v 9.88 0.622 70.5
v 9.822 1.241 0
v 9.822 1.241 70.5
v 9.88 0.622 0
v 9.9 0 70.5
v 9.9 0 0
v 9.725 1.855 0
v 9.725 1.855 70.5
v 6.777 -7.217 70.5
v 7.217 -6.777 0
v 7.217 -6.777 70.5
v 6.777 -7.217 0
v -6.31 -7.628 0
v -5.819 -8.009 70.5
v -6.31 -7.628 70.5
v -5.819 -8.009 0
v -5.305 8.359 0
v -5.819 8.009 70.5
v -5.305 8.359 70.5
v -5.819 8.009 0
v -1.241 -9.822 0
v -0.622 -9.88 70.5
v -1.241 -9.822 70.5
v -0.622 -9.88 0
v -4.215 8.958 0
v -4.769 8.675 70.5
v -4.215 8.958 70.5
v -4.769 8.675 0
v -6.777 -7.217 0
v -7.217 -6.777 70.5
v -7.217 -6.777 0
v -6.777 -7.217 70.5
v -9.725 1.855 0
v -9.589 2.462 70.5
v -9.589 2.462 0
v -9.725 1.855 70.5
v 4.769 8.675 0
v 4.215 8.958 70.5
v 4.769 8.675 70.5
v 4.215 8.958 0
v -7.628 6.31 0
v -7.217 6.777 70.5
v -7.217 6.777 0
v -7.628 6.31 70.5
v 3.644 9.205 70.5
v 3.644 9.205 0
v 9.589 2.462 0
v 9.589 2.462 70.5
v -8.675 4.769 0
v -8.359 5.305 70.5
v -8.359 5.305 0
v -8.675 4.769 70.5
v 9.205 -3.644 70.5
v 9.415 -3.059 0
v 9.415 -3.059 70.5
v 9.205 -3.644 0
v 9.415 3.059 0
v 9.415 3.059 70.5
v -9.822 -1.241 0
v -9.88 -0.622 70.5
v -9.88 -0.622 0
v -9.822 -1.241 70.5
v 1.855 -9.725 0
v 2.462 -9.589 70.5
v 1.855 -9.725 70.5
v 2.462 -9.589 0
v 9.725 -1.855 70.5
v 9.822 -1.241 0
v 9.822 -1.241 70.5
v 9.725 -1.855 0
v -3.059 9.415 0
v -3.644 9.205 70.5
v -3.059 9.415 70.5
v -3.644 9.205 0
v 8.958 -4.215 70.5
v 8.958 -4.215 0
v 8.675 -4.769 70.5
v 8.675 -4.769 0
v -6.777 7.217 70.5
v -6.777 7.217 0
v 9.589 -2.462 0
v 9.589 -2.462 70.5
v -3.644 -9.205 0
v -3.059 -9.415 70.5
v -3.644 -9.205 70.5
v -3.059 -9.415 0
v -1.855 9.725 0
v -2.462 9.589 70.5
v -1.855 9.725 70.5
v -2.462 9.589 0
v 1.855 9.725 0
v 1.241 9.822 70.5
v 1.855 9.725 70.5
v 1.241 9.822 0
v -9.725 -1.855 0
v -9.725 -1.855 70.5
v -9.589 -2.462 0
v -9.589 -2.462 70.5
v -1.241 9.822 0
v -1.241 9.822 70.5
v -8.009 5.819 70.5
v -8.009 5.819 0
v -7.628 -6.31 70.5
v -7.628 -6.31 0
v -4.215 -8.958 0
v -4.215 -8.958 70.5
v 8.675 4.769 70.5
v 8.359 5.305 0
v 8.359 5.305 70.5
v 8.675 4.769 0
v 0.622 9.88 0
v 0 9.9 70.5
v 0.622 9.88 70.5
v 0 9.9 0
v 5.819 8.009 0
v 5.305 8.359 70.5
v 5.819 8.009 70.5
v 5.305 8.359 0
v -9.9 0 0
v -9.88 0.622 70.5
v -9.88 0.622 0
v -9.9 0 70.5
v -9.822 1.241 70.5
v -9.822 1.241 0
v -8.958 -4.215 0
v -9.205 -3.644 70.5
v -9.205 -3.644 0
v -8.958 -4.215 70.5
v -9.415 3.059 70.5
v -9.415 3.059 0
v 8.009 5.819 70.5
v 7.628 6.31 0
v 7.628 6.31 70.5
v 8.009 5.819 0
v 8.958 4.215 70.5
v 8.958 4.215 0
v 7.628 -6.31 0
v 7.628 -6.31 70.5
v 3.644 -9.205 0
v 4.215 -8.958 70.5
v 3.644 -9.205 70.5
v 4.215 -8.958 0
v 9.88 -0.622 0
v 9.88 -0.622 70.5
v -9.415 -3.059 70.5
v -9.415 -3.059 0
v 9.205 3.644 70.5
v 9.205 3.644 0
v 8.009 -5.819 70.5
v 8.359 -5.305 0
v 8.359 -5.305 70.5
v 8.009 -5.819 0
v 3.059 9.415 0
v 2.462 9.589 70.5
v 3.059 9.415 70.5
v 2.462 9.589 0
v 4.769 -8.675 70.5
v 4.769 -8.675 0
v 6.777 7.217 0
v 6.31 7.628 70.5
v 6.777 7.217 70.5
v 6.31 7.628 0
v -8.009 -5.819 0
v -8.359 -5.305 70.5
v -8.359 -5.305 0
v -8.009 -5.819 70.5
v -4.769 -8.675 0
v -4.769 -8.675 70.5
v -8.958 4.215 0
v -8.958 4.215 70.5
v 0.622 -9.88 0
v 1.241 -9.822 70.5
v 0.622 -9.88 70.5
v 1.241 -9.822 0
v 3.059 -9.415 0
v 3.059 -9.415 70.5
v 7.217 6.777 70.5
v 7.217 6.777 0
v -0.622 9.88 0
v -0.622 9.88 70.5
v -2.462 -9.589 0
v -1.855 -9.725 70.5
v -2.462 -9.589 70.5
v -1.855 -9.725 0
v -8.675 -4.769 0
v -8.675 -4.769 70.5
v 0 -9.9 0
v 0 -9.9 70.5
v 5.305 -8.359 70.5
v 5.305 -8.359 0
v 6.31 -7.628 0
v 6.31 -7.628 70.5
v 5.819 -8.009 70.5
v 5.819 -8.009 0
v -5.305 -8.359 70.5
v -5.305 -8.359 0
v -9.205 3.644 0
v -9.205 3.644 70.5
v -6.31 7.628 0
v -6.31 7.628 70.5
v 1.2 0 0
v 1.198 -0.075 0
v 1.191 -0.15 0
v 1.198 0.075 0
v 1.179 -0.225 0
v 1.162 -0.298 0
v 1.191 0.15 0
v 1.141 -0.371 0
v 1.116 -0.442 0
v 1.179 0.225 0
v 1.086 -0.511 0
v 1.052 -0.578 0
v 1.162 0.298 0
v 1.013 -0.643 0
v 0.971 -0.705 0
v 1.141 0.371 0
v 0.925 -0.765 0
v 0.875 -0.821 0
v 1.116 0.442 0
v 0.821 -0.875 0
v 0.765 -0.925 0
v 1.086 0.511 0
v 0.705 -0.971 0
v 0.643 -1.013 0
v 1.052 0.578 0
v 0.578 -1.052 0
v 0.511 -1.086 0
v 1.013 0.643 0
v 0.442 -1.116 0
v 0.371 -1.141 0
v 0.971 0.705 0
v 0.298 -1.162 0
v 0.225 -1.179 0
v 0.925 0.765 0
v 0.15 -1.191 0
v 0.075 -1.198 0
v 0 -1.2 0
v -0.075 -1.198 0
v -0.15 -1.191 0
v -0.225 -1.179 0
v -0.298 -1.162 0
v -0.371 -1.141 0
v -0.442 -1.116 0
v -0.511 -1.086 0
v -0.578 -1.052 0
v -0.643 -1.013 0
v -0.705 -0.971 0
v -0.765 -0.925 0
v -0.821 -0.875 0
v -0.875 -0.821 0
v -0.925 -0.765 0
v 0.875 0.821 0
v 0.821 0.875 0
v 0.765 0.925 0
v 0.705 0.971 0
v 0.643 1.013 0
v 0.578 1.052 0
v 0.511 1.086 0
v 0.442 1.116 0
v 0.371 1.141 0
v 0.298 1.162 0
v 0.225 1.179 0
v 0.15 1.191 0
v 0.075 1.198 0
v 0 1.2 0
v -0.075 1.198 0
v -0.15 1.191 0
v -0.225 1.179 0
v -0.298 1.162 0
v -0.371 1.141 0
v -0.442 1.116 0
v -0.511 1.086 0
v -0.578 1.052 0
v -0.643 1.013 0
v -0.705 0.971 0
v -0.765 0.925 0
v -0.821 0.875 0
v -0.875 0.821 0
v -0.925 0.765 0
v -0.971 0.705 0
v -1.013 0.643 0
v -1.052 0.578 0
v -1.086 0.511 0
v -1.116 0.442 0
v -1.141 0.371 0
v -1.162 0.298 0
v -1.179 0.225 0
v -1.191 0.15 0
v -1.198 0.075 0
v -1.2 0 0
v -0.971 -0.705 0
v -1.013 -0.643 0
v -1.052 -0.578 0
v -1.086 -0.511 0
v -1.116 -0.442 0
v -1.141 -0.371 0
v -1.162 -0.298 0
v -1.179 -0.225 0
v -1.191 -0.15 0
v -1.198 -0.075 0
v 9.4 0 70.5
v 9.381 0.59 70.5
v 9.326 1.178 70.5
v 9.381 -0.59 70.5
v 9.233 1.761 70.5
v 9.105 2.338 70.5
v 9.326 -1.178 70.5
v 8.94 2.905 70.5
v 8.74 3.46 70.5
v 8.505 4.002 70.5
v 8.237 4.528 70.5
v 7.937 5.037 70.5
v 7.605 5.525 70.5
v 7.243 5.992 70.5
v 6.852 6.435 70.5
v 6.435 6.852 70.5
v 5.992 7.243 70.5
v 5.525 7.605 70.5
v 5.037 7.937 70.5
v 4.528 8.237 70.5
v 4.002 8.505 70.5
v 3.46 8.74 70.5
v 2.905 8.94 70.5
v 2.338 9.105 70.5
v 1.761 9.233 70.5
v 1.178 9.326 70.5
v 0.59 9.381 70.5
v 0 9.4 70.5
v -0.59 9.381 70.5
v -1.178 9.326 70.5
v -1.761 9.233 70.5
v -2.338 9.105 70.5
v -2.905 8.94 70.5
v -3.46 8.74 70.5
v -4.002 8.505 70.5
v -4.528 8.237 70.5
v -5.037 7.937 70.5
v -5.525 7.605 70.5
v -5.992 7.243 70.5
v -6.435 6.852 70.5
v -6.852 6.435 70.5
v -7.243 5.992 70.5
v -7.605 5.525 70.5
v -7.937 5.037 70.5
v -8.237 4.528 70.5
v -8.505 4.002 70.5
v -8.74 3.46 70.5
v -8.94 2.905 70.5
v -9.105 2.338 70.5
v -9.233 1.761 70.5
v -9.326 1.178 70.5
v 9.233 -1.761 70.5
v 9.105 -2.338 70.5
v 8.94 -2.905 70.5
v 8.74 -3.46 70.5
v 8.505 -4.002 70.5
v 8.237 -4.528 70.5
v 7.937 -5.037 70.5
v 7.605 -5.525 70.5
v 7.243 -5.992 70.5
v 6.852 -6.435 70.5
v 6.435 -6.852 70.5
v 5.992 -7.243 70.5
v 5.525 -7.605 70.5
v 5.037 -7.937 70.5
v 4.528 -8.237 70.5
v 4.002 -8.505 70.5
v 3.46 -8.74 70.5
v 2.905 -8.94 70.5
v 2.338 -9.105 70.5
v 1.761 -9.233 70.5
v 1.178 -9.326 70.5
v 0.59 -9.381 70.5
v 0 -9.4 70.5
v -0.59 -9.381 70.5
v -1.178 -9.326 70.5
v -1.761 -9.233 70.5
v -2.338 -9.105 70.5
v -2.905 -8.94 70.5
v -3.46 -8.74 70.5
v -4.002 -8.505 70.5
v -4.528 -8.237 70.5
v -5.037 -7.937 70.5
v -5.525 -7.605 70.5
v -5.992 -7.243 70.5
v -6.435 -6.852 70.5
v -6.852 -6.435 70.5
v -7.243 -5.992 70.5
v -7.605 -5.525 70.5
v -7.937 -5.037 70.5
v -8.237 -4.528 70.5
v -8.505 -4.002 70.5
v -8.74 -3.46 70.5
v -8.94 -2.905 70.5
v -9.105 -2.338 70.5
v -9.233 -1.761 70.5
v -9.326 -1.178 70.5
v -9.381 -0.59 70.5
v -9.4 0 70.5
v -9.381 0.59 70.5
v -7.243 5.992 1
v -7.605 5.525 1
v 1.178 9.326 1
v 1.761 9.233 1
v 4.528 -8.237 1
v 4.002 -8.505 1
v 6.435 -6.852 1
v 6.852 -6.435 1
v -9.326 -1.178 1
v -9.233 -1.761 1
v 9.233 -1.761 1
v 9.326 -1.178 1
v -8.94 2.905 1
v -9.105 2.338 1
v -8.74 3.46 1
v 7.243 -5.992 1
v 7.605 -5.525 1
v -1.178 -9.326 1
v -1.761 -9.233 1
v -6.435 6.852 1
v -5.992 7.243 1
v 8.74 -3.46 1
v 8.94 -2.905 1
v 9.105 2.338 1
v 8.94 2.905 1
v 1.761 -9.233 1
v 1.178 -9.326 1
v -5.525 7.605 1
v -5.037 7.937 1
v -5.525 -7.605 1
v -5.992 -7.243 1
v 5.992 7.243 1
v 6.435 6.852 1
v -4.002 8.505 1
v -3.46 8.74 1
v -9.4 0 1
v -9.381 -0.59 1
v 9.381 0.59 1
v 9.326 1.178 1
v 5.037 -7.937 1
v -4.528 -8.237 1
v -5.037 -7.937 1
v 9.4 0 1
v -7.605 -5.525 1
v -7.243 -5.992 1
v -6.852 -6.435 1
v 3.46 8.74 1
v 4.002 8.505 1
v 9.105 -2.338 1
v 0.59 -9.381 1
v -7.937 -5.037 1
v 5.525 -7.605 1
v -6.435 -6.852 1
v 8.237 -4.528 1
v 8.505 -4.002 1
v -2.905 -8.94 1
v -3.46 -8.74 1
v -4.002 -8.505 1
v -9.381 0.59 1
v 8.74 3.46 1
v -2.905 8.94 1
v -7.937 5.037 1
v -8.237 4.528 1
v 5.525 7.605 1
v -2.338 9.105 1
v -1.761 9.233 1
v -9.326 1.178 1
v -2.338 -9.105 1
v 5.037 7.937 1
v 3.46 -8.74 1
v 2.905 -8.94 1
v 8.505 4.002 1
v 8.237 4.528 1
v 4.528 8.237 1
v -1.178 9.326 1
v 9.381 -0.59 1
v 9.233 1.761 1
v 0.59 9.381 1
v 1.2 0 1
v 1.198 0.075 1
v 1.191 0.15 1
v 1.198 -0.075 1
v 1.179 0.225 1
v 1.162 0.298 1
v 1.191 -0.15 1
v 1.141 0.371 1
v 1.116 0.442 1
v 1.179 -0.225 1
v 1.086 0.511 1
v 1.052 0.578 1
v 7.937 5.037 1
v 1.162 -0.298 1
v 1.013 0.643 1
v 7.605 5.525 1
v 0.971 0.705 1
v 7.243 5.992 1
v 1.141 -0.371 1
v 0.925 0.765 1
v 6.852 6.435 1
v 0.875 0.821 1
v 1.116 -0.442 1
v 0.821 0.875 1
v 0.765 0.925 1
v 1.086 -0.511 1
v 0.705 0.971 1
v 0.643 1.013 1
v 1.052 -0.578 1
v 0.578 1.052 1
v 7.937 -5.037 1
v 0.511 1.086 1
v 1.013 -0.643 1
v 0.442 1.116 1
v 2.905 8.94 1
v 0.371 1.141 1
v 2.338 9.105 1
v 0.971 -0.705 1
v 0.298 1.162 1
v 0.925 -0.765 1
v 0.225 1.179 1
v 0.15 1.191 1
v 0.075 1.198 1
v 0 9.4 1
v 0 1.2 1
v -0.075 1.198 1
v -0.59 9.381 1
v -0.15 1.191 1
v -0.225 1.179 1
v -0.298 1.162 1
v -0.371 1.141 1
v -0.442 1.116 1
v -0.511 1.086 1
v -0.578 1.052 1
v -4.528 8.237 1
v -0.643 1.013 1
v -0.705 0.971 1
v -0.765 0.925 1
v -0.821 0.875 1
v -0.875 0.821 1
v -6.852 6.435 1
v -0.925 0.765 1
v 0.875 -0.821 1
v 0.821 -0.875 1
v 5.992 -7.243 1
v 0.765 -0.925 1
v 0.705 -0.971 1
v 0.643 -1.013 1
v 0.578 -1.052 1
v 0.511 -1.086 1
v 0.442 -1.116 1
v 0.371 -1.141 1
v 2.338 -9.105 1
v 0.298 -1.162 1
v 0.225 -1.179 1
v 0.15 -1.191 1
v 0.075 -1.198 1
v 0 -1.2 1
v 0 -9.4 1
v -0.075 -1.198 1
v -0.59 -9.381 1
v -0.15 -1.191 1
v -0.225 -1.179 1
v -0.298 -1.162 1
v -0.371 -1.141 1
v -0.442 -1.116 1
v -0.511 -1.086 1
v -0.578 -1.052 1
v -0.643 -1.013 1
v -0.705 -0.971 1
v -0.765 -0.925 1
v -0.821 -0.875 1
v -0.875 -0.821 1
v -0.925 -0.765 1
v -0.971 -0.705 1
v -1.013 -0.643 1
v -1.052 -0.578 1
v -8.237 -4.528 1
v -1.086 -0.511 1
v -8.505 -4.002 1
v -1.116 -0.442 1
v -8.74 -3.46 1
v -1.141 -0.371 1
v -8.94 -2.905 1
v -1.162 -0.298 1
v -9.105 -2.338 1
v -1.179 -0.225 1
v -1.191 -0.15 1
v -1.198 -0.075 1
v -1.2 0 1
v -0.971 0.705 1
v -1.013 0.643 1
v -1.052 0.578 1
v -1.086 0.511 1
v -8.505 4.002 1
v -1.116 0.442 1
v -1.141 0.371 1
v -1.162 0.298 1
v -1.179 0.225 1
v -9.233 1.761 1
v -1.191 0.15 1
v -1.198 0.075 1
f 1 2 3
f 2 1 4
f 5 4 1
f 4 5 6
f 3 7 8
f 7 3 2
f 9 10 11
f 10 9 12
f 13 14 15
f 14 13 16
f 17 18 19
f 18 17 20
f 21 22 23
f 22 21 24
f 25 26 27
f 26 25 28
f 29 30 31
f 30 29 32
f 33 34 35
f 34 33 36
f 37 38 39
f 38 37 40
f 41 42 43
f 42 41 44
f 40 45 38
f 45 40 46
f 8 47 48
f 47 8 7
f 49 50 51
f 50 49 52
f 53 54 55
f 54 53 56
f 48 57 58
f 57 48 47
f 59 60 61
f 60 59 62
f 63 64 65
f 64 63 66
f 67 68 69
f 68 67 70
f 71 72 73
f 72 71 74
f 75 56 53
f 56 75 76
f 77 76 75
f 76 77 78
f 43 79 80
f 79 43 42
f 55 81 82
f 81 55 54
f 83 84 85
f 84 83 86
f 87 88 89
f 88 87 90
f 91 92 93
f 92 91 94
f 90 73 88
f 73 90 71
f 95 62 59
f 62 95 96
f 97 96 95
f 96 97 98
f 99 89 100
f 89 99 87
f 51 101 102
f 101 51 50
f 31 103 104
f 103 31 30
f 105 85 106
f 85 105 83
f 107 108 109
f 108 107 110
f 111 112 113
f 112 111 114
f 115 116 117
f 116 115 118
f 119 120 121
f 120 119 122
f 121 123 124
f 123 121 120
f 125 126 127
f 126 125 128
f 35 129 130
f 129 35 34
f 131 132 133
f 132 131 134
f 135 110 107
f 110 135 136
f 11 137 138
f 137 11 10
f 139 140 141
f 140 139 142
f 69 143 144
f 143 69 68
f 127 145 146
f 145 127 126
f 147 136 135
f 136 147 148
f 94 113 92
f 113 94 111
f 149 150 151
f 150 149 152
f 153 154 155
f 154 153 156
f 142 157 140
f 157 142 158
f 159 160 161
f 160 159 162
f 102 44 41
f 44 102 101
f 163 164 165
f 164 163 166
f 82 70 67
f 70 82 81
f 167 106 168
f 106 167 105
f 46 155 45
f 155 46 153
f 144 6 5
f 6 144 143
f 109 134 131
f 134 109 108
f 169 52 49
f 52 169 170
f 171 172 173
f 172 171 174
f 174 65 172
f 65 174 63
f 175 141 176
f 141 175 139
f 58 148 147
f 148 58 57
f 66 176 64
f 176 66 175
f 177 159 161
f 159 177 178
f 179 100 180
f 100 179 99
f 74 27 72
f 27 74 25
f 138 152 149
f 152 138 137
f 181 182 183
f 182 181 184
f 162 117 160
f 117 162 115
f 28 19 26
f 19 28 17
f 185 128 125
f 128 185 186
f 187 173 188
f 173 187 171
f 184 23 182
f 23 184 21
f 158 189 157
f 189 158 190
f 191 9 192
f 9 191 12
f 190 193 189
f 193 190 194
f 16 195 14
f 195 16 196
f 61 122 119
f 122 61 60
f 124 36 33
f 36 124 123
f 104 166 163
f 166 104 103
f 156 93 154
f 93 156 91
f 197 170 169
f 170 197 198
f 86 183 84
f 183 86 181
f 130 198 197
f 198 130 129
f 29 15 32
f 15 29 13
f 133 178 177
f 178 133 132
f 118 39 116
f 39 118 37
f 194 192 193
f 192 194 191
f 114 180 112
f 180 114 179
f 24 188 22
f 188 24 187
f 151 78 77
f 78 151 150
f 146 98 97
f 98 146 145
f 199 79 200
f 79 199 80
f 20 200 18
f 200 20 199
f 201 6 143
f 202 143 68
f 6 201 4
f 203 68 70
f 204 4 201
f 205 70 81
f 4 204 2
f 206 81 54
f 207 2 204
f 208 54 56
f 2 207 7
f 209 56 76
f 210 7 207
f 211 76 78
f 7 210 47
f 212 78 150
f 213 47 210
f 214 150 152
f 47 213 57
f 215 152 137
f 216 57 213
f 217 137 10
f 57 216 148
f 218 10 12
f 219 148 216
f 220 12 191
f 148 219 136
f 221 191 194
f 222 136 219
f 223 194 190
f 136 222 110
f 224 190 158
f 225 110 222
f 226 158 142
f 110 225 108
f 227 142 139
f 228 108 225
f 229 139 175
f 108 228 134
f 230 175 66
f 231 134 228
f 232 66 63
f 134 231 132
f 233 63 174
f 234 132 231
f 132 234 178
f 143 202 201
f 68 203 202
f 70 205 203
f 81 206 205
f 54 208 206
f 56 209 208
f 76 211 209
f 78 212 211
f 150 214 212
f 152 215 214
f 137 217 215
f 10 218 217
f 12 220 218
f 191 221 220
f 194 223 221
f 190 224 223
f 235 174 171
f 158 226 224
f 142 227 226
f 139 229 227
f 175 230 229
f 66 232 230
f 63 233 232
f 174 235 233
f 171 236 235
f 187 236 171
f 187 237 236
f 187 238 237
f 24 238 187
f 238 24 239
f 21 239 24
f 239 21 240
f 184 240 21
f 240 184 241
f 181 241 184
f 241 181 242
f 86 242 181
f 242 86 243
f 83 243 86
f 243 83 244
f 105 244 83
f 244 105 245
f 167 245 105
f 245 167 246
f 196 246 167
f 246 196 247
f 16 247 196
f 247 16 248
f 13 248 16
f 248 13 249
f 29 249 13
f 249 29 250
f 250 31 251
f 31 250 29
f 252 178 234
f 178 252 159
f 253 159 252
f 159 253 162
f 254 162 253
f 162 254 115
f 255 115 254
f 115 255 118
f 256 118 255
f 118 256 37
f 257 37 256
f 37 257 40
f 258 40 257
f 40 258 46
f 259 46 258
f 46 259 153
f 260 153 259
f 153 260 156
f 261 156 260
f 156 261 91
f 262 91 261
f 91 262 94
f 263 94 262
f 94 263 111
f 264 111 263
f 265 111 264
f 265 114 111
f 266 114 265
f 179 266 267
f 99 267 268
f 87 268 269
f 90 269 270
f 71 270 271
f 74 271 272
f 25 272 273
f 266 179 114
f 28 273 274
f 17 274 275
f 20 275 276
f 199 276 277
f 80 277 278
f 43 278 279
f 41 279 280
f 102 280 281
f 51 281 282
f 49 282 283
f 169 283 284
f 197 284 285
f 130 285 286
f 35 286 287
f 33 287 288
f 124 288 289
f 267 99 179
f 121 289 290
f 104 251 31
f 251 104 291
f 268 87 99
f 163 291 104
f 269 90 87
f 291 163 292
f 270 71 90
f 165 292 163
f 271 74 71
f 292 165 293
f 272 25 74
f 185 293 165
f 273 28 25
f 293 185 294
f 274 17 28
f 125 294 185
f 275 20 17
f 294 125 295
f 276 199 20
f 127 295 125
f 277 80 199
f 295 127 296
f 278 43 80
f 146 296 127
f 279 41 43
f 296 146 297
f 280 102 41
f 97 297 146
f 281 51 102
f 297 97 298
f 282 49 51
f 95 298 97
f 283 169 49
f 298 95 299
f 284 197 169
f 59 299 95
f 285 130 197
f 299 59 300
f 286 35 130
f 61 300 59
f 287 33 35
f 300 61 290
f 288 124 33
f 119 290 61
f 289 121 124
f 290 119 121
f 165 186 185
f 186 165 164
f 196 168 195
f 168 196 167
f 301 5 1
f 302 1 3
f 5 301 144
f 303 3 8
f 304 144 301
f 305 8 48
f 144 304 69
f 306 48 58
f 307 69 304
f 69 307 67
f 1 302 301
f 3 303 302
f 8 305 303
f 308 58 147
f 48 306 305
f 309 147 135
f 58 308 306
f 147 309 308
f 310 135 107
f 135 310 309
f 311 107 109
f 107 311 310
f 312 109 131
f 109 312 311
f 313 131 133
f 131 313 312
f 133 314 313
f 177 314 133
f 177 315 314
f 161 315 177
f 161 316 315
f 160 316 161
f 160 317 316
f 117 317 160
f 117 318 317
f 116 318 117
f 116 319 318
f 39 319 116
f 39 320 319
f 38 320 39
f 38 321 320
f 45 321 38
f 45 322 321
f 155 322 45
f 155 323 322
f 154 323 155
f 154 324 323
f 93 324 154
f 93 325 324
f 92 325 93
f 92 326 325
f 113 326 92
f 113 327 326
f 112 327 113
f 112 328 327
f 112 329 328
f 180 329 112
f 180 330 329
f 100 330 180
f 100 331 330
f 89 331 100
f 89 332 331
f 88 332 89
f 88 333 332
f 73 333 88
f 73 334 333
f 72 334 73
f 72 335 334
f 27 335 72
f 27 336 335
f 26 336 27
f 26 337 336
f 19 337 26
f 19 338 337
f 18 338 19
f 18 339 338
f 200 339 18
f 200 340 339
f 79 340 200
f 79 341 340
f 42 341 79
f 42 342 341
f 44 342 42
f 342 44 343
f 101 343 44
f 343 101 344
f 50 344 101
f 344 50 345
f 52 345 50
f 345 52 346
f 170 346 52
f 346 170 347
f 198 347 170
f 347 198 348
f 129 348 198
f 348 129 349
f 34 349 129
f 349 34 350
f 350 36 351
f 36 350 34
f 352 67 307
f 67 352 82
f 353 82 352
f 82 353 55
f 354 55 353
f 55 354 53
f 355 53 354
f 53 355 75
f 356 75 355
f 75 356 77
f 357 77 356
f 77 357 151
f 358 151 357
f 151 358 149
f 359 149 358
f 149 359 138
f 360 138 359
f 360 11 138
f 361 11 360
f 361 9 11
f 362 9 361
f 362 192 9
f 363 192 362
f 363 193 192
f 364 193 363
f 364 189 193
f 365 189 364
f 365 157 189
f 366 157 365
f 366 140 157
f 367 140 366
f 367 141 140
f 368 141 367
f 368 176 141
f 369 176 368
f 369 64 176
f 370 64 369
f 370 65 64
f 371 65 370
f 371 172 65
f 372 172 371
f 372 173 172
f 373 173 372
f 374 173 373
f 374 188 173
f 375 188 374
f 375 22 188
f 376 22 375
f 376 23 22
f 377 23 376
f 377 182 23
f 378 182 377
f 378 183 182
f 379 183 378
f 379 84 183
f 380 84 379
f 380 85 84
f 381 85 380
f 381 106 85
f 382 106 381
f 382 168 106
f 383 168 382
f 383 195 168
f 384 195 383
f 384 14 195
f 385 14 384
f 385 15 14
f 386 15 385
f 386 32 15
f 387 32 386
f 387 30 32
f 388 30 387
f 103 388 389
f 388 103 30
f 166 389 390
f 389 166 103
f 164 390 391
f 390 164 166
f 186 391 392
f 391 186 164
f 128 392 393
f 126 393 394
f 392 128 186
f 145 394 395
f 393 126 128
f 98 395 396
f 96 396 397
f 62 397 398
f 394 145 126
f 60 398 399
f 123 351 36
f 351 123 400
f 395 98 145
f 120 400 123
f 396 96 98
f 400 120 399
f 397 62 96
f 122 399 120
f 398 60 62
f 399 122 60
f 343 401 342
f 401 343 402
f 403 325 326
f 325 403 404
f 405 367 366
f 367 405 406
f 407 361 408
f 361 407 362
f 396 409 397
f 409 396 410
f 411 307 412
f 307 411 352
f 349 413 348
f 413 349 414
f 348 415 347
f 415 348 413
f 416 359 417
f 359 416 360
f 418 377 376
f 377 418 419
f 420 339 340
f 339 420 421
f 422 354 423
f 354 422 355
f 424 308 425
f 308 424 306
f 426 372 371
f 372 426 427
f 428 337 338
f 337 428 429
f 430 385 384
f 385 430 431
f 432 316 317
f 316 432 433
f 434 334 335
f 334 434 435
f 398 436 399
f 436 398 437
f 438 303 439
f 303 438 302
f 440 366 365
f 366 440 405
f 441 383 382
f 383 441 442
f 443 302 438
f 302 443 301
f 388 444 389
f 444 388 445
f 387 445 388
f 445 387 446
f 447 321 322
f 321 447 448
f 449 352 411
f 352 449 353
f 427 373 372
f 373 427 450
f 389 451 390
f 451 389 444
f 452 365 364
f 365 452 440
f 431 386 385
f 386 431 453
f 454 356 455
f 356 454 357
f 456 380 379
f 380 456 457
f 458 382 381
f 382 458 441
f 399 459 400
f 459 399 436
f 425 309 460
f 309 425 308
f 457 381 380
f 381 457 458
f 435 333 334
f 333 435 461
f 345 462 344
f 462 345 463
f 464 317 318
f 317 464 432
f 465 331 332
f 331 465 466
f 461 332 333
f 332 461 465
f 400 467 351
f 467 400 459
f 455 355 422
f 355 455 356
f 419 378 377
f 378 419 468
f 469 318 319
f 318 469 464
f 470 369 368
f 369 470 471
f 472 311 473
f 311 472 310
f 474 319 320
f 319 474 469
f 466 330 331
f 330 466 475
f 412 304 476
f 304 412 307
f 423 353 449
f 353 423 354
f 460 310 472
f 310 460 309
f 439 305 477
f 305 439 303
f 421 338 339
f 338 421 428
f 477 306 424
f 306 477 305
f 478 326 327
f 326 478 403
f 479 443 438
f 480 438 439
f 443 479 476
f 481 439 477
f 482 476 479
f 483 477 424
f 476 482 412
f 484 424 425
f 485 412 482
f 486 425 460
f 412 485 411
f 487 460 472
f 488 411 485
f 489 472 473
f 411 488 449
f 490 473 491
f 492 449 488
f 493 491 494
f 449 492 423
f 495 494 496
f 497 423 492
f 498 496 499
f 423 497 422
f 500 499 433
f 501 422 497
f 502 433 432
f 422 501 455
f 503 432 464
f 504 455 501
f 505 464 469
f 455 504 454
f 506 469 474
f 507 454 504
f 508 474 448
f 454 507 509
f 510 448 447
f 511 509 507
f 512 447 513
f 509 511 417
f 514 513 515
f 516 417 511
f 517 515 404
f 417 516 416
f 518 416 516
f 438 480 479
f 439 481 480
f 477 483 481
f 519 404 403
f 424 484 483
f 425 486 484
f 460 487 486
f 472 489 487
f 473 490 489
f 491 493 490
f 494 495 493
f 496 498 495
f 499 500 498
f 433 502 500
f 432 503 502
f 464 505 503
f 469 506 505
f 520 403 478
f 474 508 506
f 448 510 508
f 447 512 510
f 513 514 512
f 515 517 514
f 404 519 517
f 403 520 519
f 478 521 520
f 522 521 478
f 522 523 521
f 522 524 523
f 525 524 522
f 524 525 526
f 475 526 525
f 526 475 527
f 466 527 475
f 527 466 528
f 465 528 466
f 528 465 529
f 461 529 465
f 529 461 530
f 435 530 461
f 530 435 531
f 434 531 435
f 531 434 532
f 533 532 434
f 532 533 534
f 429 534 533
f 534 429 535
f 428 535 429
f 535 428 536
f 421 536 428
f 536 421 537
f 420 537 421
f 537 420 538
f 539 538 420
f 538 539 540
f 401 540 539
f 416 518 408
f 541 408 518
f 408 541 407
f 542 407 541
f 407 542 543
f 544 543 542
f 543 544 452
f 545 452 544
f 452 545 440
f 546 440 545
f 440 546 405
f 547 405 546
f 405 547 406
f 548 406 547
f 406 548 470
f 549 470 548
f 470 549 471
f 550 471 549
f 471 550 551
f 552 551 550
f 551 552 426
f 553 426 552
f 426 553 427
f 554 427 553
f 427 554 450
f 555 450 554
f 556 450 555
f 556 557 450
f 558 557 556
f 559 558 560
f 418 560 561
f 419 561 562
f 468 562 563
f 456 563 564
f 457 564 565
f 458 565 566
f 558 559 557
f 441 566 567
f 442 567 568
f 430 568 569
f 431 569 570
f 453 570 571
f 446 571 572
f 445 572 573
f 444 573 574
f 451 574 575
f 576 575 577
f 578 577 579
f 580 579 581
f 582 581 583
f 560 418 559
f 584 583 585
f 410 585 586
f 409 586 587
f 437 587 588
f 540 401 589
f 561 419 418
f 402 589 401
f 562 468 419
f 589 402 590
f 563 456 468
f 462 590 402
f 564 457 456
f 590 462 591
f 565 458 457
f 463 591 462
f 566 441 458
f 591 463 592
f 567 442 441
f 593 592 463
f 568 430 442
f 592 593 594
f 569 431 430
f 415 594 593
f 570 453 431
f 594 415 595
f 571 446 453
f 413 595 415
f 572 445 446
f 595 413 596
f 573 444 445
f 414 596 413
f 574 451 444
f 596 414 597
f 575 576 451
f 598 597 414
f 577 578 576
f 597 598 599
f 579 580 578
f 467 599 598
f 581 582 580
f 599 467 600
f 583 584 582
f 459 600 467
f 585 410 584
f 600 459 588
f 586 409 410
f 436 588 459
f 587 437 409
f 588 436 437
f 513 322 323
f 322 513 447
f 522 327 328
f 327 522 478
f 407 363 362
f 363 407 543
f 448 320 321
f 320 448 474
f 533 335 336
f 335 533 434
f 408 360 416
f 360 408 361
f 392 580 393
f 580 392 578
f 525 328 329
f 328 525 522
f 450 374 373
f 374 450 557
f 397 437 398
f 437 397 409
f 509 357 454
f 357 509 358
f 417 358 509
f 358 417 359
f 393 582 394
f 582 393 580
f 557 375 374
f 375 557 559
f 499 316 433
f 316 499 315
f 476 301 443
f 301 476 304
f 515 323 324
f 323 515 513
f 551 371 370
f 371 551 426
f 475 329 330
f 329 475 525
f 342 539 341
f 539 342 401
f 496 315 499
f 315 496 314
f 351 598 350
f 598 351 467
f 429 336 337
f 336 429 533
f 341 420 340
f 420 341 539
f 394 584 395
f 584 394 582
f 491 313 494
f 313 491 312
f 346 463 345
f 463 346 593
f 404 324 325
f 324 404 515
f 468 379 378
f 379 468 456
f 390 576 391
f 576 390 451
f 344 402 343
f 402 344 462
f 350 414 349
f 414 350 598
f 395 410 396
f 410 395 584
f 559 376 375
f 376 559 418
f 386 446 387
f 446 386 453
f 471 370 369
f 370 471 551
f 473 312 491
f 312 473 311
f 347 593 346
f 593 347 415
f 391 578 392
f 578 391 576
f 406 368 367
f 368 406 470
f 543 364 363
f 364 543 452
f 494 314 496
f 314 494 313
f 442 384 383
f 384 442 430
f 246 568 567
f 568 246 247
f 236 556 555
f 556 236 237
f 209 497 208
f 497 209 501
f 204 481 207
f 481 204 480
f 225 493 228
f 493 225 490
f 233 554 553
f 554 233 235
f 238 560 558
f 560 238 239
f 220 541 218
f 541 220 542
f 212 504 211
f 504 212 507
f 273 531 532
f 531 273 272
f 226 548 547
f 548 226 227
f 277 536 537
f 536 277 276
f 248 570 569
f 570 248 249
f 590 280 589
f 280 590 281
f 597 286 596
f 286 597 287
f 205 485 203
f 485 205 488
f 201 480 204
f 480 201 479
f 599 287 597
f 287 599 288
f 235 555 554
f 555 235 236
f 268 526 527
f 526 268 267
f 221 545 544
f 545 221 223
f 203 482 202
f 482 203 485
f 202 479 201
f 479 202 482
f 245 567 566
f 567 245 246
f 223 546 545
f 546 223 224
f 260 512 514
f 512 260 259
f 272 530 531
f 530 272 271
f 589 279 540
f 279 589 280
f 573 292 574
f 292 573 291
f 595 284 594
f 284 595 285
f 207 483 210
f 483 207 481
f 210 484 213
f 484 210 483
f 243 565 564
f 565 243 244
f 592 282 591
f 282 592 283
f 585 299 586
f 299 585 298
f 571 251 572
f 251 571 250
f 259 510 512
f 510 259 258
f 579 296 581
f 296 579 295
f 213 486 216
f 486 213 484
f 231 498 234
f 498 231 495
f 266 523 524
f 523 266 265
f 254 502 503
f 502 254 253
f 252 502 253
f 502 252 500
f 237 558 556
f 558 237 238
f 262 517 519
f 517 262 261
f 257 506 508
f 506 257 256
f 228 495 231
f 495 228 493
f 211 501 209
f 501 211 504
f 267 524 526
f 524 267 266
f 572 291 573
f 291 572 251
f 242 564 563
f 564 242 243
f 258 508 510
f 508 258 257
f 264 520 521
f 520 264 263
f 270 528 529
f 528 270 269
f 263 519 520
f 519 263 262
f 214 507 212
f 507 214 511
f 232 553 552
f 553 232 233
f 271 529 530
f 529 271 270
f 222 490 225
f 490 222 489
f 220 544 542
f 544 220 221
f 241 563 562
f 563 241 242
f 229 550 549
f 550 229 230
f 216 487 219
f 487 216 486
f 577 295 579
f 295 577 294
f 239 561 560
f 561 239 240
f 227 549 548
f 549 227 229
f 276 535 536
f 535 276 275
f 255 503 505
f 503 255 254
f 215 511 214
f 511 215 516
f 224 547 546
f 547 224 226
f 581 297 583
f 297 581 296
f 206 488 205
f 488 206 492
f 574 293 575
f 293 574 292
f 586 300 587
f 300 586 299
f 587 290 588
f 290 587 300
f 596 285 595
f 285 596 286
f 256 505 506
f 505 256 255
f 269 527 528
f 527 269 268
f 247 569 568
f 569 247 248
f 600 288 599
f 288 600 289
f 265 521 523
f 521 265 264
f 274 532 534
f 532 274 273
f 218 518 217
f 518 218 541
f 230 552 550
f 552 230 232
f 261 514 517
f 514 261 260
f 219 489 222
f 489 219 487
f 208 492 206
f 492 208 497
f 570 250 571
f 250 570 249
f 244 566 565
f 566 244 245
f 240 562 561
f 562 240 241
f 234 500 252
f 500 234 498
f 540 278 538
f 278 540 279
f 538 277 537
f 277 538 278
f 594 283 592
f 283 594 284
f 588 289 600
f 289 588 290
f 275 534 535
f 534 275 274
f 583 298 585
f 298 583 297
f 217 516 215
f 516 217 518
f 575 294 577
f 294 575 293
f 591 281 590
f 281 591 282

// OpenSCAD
diameter = 18.8;   // CHANGE THIS
radius = diameter / 2;
thickness = 0.5;
height = 65;
cap_height = 5;
hole_radius = 1.2;

difference() {
  cylinder($fn=100, cap_height+height+thickness, radius+thickness, radius+thickness);
  translate([0,0,1]) cylinder($fn=100, cap_height+height+1, radius, radius);
  translate([0,0,-1]) cylinder($fn=100, 1+2, hole_radius, hole_radius);
}
